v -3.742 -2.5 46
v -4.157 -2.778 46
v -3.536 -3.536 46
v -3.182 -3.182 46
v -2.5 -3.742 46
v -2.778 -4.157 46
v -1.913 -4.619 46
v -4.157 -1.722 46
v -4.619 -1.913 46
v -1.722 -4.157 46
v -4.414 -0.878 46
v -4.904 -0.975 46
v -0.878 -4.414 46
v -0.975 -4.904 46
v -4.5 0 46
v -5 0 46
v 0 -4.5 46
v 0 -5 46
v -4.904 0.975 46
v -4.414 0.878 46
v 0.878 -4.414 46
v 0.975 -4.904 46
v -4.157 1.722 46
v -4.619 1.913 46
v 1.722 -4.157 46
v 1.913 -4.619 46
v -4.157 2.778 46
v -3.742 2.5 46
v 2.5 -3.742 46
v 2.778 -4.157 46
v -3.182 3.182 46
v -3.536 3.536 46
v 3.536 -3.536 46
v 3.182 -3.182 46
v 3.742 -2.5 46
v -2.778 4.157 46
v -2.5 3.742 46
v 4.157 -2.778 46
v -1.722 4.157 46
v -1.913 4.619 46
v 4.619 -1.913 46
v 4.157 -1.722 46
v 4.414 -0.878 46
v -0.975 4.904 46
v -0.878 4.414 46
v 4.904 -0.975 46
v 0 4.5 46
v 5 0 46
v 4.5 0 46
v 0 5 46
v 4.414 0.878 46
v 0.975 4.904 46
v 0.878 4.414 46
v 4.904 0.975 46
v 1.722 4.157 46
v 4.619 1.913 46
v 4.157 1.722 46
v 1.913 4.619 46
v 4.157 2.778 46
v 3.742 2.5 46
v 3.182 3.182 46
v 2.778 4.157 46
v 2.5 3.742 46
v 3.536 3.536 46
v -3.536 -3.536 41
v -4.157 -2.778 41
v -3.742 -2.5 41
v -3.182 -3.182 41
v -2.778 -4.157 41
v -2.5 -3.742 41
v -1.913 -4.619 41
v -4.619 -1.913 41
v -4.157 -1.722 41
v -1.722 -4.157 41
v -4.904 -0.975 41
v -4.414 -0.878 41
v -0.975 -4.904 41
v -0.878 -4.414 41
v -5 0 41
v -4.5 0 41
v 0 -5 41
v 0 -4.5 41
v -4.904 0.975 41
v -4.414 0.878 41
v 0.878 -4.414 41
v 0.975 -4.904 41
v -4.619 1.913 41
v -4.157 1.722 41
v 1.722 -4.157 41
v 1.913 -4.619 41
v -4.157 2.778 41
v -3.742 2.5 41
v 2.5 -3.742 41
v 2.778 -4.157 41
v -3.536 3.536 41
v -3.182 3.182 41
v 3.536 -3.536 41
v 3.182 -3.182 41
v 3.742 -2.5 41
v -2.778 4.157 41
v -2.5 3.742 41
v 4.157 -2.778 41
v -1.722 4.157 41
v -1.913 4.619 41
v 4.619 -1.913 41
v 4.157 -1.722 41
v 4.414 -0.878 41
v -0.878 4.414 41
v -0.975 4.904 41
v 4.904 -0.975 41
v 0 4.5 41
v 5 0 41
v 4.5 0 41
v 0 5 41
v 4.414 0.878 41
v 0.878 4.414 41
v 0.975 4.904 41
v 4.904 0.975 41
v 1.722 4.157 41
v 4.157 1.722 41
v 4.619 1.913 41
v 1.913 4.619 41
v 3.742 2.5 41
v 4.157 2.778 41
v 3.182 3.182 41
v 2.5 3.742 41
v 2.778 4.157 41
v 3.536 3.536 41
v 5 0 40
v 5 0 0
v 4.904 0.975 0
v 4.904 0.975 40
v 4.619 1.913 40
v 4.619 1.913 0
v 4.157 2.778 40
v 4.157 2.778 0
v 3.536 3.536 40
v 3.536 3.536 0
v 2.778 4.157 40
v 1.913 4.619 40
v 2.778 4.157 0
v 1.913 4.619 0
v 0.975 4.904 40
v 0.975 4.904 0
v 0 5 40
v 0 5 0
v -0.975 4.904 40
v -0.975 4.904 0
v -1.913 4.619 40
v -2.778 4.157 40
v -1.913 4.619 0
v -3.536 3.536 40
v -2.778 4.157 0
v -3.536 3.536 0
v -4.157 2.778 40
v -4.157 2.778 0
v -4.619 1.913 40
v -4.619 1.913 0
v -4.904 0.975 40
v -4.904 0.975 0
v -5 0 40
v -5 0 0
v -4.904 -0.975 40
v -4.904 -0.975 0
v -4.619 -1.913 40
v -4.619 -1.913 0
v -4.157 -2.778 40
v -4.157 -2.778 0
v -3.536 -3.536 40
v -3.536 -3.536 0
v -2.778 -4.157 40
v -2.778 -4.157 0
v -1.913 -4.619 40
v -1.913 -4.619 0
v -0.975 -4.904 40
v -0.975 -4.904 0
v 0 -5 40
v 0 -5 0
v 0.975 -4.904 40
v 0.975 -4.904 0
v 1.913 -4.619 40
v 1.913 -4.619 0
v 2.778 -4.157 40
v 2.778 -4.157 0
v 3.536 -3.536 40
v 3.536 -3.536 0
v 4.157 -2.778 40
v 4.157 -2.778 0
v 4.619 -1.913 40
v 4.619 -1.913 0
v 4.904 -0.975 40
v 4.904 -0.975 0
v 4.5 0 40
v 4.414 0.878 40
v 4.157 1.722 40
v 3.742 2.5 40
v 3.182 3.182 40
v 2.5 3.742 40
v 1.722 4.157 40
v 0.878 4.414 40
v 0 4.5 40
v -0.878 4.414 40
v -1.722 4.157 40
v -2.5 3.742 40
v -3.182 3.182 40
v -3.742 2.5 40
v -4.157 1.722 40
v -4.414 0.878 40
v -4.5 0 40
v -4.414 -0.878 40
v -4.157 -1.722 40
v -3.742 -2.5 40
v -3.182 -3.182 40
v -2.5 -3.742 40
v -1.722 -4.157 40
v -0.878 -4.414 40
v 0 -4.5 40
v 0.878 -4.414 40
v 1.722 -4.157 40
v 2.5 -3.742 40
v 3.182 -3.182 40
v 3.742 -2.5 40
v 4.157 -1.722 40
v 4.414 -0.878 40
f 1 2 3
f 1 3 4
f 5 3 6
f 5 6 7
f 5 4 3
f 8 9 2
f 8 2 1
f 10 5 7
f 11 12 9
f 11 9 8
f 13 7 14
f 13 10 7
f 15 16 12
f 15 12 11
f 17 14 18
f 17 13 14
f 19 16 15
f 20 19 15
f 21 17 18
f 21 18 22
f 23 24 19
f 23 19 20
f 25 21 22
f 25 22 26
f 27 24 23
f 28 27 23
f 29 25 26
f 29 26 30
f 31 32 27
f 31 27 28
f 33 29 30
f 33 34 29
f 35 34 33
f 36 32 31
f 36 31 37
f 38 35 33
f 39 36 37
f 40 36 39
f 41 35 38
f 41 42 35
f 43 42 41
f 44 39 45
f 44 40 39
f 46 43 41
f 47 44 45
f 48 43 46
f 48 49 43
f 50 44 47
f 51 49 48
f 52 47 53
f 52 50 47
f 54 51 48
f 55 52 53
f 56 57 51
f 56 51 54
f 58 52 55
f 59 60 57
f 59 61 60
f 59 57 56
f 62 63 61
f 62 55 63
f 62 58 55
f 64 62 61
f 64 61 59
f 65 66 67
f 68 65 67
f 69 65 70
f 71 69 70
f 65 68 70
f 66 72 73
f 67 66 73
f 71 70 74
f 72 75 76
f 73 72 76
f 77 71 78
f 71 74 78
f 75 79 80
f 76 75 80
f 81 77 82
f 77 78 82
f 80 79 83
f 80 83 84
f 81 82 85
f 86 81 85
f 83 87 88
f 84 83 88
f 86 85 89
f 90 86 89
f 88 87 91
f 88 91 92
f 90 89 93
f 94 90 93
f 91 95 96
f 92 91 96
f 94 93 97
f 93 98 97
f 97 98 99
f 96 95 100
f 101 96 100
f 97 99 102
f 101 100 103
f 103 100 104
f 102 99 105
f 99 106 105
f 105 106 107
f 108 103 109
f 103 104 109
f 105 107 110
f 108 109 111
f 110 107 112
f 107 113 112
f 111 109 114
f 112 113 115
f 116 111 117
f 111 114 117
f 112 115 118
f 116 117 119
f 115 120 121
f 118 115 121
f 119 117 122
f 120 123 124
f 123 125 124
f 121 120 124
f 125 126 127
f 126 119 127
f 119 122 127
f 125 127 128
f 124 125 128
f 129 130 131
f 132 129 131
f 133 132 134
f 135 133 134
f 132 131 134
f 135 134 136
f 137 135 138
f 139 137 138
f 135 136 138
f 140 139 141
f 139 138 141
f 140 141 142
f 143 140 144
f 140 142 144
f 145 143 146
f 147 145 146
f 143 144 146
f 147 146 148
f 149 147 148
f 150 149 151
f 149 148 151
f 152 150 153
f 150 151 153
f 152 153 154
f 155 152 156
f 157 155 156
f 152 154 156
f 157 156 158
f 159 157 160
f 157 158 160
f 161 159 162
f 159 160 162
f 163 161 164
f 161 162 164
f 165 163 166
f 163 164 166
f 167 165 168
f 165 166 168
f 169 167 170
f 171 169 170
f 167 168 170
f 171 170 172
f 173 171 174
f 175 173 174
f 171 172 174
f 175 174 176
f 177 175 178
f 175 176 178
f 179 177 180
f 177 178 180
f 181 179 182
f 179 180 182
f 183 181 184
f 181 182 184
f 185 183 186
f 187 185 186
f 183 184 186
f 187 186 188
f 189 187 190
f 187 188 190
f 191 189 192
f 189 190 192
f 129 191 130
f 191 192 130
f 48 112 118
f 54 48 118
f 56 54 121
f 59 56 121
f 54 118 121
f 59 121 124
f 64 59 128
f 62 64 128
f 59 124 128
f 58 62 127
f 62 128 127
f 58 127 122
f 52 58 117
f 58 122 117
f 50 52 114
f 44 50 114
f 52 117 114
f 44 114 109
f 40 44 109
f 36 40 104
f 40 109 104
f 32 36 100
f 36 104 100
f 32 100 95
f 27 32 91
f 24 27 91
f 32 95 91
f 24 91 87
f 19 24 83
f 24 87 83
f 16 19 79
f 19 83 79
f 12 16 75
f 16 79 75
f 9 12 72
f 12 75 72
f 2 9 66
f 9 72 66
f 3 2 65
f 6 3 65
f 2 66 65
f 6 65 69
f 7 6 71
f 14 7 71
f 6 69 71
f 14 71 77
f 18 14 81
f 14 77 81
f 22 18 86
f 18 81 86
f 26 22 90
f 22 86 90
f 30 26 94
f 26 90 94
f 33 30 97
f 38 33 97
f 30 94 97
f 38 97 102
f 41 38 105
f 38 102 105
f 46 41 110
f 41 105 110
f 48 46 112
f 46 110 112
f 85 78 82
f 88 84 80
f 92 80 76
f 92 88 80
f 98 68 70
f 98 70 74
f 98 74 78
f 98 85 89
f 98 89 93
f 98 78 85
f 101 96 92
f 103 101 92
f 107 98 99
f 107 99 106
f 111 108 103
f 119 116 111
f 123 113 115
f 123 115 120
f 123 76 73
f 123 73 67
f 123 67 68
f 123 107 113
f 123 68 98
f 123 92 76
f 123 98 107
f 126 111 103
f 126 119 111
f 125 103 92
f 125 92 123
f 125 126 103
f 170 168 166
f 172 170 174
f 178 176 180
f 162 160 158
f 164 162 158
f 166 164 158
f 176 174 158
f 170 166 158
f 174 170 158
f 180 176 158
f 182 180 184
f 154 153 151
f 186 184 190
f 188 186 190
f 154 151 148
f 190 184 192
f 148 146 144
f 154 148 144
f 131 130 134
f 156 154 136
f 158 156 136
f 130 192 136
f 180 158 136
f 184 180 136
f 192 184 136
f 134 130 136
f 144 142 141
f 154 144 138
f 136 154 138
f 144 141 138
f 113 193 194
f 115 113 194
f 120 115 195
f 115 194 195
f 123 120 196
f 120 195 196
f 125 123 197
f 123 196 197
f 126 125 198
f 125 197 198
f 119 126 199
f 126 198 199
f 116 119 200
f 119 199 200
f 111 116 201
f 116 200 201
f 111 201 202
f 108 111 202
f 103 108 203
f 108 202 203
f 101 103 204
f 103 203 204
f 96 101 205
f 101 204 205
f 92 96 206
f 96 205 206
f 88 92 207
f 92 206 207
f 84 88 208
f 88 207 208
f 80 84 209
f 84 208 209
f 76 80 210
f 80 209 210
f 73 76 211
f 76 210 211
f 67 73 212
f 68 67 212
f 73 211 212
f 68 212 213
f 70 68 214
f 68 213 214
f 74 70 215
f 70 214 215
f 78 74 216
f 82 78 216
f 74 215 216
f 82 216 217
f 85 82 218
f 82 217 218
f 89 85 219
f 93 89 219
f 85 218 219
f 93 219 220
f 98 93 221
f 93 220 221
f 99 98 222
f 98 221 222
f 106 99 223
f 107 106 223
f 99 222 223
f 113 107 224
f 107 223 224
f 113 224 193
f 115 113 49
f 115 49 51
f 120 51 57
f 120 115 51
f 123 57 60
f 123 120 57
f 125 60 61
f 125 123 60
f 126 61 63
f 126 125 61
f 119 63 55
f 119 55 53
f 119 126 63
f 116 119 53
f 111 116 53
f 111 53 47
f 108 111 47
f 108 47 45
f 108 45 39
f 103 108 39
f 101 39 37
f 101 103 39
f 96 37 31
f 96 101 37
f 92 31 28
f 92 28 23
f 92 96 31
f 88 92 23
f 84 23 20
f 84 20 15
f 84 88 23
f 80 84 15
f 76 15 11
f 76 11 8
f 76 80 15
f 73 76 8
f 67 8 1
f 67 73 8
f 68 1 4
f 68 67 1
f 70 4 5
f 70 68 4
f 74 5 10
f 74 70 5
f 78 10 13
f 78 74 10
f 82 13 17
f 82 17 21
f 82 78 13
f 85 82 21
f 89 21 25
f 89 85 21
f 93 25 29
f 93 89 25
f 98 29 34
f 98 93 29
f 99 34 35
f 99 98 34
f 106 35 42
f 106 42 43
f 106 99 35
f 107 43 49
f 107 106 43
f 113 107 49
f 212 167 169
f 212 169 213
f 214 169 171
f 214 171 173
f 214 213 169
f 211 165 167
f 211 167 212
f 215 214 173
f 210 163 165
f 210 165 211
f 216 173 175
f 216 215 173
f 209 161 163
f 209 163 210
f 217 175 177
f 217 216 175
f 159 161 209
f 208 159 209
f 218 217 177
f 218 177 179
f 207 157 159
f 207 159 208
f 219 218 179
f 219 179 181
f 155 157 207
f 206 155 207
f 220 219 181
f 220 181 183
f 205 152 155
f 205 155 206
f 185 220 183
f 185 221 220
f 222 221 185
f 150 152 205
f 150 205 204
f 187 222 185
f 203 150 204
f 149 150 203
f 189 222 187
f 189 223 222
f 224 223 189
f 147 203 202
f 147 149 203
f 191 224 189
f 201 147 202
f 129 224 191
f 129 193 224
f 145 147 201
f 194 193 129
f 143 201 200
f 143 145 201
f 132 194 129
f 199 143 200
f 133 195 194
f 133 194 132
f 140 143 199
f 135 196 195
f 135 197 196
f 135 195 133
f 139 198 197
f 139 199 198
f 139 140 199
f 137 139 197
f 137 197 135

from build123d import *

# Parameters (mm, degrees)
F0_R     = 5
F1_DEPTH = 40
F2_R     = 4.5
F3_DEPTH = 1
F4_R     = 5
F4_R_2   = 4.5
F5_DEPTH = 5


with BuildPart() as f1:
    # F0 (on Top) → F1 (new body)
    with BuildSketch(Plane.XY):
        Circle(F0_R)
    extrude(amount=F1_DEPTH)

    # F2 (on face) → F3 (join)
    with BuildSketch(Plane.XY.offset(40)):
        Circle(F2_R)
    extrude(amount=F3_DEPTH)


with BuildPart() as f5:
    # F4 (on face) → F5 (new body)
    with BuildSketch(Plane.XY.offset(41)):
        Circle(F4_R)
        Circle(F4_R_2, mode=Mode.SUBTRACT)
    extrude(amount=F5_DEPTH)


solid = Compound([f1.part, f5.part])
